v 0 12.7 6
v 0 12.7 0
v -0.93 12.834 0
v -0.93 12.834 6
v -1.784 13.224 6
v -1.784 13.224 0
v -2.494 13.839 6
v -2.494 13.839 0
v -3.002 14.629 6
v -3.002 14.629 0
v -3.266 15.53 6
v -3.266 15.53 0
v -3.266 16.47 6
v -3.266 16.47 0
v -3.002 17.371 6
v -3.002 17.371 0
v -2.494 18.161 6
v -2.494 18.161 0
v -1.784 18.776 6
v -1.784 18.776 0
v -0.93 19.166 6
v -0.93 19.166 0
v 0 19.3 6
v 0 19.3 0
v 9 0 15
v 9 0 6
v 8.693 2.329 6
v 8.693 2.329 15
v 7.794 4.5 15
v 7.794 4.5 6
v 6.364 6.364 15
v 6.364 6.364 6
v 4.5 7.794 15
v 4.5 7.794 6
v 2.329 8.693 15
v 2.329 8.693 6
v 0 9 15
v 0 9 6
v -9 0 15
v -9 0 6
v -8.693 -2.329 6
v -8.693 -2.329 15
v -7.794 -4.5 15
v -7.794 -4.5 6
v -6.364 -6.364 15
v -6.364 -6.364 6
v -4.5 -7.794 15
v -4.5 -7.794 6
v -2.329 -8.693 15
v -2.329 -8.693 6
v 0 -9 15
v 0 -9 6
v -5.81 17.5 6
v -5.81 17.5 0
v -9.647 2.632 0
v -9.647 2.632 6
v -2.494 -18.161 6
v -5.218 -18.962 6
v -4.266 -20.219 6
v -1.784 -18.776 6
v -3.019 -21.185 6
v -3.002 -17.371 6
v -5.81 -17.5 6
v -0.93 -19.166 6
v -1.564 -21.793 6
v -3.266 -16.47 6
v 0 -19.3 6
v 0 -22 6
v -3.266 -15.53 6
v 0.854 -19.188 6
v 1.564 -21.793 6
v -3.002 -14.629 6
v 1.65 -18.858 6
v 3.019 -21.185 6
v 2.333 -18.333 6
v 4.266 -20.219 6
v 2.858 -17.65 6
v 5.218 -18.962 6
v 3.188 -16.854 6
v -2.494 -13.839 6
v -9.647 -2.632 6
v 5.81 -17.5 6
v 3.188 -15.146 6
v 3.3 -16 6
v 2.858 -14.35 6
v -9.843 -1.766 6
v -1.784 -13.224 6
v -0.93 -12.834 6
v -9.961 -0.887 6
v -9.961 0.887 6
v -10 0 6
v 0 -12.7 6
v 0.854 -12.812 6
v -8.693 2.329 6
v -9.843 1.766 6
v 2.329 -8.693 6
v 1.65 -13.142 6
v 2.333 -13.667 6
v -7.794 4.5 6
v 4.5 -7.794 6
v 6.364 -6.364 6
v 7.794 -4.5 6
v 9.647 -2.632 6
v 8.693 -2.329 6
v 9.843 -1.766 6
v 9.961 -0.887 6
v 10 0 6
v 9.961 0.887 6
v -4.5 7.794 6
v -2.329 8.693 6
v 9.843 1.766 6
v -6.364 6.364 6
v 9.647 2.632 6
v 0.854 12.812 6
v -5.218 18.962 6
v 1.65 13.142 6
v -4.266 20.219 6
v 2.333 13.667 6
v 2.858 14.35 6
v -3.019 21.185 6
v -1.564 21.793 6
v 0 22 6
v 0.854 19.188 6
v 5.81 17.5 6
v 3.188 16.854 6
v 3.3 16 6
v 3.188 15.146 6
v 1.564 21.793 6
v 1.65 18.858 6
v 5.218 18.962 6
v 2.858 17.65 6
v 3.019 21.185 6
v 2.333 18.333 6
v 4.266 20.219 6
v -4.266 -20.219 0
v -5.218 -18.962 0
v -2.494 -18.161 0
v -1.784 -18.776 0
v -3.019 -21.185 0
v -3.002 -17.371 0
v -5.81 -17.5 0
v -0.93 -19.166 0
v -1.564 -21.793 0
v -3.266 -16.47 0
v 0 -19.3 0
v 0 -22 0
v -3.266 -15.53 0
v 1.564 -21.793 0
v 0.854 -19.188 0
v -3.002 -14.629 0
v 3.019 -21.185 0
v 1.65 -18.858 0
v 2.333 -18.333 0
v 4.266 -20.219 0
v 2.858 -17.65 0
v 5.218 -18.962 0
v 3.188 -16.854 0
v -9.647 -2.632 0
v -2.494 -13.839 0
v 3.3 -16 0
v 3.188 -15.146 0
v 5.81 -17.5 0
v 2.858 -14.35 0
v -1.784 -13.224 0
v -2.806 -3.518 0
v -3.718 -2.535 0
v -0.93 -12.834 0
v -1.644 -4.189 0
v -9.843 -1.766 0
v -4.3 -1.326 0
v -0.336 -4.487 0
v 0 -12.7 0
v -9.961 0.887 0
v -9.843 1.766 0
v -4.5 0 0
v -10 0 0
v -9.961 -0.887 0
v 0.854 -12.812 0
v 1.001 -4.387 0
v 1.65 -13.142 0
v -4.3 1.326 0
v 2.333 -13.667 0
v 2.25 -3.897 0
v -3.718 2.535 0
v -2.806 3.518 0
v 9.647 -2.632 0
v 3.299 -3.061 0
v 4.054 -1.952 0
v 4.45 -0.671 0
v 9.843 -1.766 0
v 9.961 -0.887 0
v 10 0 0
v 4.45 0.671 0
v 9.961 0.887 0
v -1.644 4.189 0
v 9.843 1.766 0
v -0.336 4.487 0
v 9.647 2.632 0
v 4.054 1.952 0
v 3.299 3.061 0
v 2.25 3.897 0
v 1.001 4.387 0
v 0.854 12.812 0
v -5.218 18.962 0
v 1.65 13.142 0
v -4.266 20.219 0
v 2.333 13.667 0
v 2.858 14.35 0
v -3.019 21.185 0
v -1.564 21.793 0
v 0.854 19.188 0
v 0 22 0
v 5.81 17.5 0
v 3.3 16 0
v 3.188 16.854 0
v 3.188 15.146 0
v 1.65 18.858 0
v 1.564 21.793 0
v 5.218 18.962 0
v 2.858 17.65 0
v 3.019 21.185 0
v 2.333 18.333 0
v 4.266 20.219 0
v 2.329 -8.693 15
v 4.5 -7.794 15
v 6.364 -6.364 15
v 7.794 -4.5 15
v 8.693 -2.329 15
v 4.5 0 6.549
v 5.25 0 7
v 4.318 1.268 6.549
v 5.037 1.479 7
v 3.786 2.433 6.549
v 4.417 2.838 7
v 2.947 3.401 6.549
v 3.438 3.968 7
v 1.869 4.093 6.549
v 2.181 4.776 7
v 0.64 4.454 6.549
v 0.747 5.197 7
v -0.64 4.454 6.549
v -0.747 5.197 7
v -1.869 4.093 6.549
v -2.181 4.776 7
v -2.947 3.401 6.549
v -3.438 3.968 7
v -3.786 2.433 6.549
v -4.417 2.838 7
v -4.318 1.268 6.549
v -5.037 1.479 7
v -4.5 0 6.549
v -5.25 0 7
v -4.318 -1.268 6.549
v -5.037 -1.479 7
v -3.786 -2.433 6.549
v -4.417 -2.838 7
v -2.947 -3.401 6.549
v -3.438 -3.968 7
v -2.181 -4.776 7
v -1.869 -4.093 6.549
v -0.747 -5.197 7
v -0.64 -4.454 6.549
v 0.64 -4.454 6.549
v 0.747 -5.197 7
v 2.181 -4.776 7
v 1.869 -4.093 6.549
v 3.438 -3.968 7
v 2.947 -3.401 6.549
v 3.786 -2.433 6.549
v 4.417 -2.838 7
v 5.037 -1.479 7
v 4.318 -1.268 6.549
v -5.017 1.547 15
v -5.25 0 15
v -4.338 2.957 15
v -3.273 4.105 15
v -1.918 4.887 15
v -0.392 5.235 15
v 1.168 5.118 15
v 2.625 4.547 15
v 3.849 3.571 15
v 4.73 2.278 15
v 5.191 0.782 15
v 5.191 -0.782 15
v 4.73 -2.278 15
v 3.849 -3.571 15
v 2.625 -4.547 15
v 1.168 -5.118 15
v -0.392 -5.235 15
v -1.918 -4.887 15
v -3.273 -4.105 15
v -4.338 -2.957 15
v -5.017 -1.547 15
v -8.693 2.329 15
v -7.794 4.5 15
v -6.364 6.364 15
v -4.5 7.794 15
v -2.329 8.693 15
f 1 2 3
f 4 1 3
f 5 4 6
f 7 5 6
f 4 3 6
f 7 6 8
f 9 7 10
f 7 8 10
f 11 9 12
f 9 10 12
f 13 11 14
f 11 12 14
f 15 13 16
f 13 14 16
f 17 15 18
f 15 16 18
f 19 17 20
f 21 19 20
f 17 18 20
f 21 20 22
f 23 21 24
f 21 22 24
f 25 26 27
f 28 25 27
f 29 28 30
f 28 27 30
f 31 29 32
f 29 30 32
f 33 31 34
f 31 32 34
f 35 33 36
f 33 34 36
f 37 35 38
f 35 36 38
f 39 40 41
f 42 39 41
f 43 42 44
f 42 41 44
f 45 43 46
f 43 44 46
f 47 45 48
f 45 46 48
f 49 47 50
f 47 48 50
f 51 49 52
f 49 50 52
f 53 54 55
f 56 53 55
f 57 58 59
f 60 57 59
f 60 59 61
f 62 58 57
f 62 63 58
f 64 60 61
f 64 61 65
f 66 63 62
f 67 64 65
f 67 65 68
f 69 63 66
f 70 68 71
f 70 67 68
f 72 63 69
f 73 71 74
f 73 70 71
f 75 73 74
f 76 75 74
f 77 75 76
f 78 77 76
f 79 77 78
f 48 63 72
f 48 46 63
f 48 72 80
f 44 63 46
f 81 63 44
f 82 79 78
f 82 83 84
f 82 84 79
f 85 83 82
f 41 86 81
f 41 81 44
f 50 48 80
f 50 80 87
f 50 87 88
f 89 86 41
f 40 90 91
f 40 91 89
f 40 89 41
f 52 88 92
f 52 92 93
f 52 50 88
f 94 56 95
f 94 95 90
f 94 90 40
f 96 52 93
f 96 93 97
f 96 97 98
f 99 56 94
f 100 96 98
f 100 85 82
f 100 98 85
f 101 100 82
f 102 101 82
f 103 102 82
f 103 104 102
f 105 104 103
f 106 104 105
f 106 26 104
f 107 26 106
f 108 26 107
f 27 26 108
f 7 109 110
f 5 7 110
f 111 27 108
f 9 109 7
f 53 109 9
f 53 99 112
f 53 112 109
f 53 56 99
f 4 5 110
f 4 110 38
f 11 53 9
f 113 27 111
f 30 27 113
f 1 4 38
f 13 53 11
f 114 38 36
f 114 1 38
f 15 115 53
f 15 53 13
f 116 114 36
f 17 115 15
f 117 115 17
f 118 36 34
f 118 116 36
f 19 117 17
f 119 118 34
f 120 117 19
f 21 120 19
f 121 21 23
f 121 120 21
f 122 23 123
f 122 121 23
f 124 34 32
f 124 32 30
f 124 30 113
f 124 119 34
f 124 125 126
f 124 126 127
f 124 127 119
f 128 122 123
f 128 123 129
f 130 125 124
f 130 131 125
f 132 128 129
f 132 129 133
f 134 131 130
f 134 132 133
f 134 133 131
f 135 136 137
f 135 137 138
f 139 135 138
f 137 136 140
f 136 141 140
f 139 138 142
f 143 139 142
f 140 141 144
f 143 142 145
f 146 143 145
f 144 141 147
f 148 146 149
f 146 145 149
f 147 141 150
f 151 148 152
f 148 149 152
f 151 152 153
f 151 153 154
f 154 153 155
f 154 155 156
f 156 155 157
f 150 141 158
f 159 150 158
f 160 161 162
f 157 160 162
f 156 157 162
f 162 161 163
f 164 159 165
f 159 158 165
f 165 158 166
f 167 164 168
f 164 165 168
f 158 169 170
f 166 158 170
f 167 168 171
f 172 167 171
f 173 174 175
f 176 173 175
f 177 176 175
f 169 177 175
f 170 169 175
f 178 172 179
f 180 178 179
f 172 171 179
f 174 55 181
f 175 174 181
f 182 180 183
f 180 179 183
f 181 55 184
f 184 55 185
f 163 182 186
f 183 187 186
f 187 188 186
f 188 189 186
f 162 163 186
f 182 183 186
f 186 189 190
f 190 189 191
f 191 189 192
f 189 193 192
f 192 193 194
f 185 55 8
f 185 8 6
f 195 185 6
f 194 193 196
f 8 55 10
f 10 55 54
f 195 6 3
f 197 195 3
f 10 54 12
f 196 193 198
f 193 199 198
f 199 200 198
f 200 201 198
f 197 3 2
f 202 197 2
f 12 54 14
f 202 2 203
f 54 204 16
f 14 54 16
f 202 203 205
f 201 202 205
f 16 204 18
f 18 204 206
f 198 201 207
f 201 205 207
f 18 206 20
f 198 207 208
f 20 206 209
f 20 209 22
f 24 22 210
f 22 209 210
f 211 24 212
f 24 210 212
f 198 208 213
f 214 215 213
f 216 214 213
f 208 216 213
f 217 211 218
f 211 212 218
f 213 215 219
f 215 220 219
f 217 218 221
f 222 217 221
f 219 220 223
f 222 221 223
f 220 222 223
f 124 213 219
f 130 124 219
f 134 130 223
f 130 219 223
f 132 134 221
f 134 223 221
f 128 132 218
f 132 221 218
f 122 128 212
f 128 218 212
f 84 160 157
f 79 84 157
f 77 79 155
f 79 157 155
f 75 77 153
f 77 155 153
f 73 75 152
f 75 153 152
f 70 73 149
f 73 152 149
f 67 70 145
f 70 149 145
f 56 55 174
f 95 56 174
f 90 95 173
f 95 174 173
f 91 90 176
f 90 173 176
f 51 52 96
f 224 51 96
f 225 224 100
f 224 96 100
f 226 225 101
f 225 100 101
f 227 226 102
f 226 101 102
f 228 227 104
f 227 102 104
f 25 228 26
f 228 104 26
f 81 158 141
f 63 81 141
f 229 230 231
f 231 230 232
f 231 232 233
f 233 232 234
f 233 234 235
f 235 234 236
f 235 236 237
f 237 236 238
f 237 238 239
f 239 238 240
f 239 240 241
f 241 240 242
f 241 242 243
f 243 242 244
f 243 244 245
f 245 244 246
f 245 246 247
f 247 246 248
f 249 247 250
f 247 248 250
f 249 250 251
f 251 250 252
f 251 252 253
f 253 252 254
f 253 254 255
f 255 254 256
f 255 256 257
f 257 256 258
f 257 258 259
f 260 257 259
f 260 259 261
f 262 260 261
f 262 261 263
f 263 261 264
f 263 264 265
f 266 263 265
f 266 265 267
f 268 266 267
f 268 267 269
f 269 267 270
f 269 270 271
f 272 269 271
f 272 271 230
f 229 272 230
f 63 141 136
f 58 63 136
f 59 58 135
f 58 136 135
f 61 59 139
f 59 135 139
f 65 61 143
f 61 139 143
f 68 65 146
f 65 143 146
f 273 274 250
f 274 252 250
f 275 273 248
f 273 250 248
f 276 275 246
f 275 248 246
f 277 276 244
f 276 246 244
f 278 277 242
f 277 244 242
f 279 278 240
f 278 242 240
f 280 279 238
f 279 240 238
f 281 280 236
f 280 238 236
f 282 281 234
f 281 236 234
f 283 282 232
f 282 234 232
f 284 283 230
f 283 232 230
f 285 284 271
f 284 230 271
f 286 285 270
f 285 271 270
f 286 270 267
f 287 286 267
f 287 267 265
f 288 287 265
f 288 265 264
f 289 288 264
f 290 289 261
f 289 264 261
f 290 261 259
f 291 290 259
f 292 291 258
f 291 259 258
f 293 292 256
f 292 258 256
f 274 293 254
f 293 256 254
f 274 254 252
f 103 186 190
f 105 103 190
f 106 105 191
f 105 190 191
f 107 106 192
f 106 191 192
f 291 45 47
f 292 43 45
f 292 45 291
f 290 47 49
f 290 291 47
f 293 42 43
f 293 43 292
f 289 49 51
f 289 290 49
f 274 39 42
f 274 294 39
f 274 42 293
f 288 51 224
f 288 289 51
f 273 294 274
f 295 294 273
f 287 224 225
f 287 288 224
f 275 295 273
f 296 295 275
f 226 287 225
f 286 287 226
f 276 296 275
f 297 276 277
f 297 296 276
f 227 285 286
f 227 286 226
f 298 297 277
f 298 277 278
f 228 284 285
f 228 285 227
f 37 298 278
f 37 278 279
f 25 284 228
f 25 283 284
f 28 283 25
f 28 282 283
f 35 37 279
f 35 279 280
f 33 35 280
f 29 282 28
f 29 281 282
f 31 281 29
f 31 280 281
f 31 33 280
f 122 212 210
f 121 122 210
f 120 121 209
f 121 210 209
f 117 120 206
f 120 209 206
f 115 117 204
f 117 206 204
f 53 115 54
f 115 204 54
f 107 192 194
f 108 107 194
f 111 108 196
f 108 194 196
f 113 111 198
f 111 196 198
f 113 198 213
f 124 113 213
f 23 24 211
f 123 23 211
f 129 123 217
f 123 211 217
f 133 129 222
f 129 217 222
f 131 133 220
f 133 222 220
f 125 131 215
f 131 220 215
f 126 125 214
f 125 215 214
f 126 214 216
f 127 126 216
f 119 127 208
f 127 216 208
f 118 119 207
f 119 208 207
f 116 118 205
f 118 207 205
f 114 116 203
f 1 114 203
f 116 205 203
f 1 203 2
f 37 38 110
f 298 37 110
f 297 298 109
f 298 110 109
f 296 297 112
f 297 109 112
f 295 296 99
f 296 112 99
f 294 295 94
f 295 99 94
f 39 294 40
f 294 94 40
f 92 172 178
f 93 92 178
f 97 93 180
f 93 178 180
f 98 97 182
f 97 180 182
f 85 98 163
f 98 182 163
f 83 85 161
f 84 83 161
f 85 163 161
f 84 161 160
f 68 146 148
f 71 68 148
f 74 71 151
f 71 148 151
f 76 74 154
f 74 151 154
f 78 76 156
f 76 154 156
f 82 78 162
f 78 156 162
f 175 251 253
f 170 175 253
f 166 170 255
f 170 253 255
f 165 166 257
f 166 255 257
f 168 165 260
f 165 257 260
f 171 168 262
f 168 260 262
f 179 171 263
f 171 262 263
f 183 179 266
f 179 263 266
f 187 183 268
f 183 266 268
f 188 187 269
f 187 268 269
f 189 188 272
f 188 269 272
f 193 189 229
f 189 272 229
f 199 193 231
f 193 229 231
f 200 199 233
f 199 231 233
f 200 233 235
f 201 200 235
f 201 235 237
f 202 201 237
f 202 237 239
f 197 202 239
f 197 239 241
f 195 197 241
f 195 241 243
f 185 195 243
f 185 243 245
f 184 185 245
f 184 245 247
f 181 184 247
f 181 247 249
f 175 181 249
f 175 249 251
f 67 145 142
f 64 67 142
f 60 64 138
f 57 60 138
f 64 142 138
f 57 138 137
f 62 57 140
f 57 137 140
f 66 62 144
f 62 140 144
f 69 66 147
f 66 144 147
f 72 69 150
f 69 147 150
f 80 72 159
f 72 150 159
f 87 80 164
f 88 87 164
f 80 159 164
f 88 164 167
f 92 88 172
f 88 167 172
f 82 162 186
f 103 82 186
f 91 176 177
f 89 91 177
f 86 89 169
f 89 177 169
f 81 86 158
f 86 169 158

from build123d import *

# Parameters (mm, degrees)
F1_DEPTH = 6
F2_DEPTH = 15
F5_D     = 10.5
F5_DEPTH = 8
F5_TIP   = 3.1545182499
F6_D     = 9
F6_DEPTH = 8
F6_TIP   = 2.7038727856


with BuildPart() as f1:
    # F0 (on Top) → F1 (new body)
    with BuildSketch(Plane.XY):
        with BuildLine():
            ThreePointArc((0, 9), (6.3639610307, 6.3639610307), (9, 0))
            Line((9, 0), (10, 0))
            ThreePointArc((10, 0), (9.9114443967, 1.327881761), (9.6473460058, 2.6322452478))
            Line((9.6473460058, 2.6322452478), (5.8095664532, 17.4996458335))
            ThreePointArc((5.8095664532, 17.4996458335), (3.6743791992, 20.7433044917), (0, 22))
            Line((0, 22), (0, 19.3))
            ThreePointArc((0, 19.3), (2.3334523779, 18.3334523779), (3.3, 16))
            ThreePointArc((3.3, 16), (2.3334523779, 13.6665476221), (0, 12.7))
            Line((0, 12.7), (0, 9))
        make_face()
        with BuildLine():
            ThreePointArc((-9, 0), (-6.3639610307, 6.3639610307), (0, 9))
            Line((0, 9), (0, 12.7))
            ThreePointArc((0, 12.7), (-3.3, 16), (0, 19.3))
            Line((0, 19.3), (0, 22))
            ThreePointArc((0, 22), (-3.6743791992, 20.7433044917), (-5.8095664532, 17.4996458335))
            Line((-5.8095664532, 17.4996458335), (-9.6473460058, 2.6322452478))
            ThreePointArc((-9.6473460058, 2.6322452478), (-9.9114443967, 1.327881761), (-10, 0))
            Line((-10, 0), (-9, 0))
        make_face()
        with BuildLine():
            Line((0, -12.7), (0, -9))
            ThreePointArc((0, -9), (-6.3639610307, -6.3639610307), (-9, 0))
            Line((-9, 0), (-10, 0))
            ThreePointArc((-10, 0), (-9.9114443967, -1.327881761), (-9.6473460058, -2.6322452478))
            Line((-9.6473460058, -2.6322452478), (-5.8095664532, -17.4996458335))
            ThreePointArc((-5.8095664532, -17.4996458335), (-3.6743791992, -20.7433044917), (0, -22))
            Line((0, -22), (0, -19.3))
            ThreePointArc((0, -19.3), (-3.3, -16), (0, -12.7))
        make_face()
        with BuildLine():
            Line((10, 0), (9, 0))
            ThreePointArc((9, 0), (6.3639610307, -6.3639610307), (0, -9))
            Line((0, -9), (0, -12.7))
            ThreePointArc((0, -12.7), (2.3334523779, -13.6665476221), (3.3, -16))
            ThreePointArc((3.3, -16), (2.3334523779, -18.3334523779), (0, -19.3))
            Line((0, -19.3), (0, -22))
            ThreePointArc((0, -22), (3.6743791992, -20.7433044917), (5.8095664532, -17.4996458335))
            Line((5.8095664532, -17.4996458335), (9.6473460058, -2.6322452478))
            ThreePointArc((9.6473460058, -2.6322452478), (9.9114443967, -1.327881761), (10, 0))
        make_face()
    extrude(amount=F1_DEPTH)

    # F0 (on Top) → F2 (join)
    with BuildSketch(Plane.XY):
        with BuildLine():
            ThreePointArc((-9, 0), (-6.3639610307, -6.3639610307), (0, -9))
            Line((0, -9), (0, 0))
            Line((0, 0), (-9, 0))
        make_face()
        with BuildLine():
            Line((0, 0), (0, 9))
            ThreePointArc((0, 9), (-6.3639610307, 6.3639610307), (-9, 0))
            Line((-9, 0), (0, 0))
        make_face()
        with BuildLine():
            Line((0, 0), (9, 0))
            ThreePointArc((9, 0), (6.3639610307, 6.3639610307), (0, 9))
            Line((0, 9), (0, 0))
        make_face()
        with BuildLine():
            ThreePointArc((0, -9), (6.3639610307, -6.3639610307), (9, 0))
            Line((9, 0), (0, 0))
            Line((0, 0), (0, -9))
        make_face()
    extrude(amount=F2_DEPTH)

    # F5
    with Locations(Plane.XY.offset(15)):
        with Locations((0, 0)):
            Hole(F5_D / 2, depth=F5_DEPTH)
            with Locations((0, 0, -(F5_DEPTH + F5_TIP / 2))):  # 118° drill point
                Cone(0, F5_D / 2, F5_TIP, mode=Mode.SUBTRACT)

    # F6
    with Locations(Plane(origin=(0, 0, 0), x_dir=(1, 0, 0), z_dir=(0, 0, -1))):
        with Locations((0, 0)):
            Hole(F6_D / 2, depth=F6_DEPTH)
            with Locations((0, 0, -(F6_DEPTH + F6_TIP / 2))):  # 118° drill point
                Cone(0, F6_D / 2, F6_TIP, mode=Mode.SUBTRACT)


solid = f1.part
